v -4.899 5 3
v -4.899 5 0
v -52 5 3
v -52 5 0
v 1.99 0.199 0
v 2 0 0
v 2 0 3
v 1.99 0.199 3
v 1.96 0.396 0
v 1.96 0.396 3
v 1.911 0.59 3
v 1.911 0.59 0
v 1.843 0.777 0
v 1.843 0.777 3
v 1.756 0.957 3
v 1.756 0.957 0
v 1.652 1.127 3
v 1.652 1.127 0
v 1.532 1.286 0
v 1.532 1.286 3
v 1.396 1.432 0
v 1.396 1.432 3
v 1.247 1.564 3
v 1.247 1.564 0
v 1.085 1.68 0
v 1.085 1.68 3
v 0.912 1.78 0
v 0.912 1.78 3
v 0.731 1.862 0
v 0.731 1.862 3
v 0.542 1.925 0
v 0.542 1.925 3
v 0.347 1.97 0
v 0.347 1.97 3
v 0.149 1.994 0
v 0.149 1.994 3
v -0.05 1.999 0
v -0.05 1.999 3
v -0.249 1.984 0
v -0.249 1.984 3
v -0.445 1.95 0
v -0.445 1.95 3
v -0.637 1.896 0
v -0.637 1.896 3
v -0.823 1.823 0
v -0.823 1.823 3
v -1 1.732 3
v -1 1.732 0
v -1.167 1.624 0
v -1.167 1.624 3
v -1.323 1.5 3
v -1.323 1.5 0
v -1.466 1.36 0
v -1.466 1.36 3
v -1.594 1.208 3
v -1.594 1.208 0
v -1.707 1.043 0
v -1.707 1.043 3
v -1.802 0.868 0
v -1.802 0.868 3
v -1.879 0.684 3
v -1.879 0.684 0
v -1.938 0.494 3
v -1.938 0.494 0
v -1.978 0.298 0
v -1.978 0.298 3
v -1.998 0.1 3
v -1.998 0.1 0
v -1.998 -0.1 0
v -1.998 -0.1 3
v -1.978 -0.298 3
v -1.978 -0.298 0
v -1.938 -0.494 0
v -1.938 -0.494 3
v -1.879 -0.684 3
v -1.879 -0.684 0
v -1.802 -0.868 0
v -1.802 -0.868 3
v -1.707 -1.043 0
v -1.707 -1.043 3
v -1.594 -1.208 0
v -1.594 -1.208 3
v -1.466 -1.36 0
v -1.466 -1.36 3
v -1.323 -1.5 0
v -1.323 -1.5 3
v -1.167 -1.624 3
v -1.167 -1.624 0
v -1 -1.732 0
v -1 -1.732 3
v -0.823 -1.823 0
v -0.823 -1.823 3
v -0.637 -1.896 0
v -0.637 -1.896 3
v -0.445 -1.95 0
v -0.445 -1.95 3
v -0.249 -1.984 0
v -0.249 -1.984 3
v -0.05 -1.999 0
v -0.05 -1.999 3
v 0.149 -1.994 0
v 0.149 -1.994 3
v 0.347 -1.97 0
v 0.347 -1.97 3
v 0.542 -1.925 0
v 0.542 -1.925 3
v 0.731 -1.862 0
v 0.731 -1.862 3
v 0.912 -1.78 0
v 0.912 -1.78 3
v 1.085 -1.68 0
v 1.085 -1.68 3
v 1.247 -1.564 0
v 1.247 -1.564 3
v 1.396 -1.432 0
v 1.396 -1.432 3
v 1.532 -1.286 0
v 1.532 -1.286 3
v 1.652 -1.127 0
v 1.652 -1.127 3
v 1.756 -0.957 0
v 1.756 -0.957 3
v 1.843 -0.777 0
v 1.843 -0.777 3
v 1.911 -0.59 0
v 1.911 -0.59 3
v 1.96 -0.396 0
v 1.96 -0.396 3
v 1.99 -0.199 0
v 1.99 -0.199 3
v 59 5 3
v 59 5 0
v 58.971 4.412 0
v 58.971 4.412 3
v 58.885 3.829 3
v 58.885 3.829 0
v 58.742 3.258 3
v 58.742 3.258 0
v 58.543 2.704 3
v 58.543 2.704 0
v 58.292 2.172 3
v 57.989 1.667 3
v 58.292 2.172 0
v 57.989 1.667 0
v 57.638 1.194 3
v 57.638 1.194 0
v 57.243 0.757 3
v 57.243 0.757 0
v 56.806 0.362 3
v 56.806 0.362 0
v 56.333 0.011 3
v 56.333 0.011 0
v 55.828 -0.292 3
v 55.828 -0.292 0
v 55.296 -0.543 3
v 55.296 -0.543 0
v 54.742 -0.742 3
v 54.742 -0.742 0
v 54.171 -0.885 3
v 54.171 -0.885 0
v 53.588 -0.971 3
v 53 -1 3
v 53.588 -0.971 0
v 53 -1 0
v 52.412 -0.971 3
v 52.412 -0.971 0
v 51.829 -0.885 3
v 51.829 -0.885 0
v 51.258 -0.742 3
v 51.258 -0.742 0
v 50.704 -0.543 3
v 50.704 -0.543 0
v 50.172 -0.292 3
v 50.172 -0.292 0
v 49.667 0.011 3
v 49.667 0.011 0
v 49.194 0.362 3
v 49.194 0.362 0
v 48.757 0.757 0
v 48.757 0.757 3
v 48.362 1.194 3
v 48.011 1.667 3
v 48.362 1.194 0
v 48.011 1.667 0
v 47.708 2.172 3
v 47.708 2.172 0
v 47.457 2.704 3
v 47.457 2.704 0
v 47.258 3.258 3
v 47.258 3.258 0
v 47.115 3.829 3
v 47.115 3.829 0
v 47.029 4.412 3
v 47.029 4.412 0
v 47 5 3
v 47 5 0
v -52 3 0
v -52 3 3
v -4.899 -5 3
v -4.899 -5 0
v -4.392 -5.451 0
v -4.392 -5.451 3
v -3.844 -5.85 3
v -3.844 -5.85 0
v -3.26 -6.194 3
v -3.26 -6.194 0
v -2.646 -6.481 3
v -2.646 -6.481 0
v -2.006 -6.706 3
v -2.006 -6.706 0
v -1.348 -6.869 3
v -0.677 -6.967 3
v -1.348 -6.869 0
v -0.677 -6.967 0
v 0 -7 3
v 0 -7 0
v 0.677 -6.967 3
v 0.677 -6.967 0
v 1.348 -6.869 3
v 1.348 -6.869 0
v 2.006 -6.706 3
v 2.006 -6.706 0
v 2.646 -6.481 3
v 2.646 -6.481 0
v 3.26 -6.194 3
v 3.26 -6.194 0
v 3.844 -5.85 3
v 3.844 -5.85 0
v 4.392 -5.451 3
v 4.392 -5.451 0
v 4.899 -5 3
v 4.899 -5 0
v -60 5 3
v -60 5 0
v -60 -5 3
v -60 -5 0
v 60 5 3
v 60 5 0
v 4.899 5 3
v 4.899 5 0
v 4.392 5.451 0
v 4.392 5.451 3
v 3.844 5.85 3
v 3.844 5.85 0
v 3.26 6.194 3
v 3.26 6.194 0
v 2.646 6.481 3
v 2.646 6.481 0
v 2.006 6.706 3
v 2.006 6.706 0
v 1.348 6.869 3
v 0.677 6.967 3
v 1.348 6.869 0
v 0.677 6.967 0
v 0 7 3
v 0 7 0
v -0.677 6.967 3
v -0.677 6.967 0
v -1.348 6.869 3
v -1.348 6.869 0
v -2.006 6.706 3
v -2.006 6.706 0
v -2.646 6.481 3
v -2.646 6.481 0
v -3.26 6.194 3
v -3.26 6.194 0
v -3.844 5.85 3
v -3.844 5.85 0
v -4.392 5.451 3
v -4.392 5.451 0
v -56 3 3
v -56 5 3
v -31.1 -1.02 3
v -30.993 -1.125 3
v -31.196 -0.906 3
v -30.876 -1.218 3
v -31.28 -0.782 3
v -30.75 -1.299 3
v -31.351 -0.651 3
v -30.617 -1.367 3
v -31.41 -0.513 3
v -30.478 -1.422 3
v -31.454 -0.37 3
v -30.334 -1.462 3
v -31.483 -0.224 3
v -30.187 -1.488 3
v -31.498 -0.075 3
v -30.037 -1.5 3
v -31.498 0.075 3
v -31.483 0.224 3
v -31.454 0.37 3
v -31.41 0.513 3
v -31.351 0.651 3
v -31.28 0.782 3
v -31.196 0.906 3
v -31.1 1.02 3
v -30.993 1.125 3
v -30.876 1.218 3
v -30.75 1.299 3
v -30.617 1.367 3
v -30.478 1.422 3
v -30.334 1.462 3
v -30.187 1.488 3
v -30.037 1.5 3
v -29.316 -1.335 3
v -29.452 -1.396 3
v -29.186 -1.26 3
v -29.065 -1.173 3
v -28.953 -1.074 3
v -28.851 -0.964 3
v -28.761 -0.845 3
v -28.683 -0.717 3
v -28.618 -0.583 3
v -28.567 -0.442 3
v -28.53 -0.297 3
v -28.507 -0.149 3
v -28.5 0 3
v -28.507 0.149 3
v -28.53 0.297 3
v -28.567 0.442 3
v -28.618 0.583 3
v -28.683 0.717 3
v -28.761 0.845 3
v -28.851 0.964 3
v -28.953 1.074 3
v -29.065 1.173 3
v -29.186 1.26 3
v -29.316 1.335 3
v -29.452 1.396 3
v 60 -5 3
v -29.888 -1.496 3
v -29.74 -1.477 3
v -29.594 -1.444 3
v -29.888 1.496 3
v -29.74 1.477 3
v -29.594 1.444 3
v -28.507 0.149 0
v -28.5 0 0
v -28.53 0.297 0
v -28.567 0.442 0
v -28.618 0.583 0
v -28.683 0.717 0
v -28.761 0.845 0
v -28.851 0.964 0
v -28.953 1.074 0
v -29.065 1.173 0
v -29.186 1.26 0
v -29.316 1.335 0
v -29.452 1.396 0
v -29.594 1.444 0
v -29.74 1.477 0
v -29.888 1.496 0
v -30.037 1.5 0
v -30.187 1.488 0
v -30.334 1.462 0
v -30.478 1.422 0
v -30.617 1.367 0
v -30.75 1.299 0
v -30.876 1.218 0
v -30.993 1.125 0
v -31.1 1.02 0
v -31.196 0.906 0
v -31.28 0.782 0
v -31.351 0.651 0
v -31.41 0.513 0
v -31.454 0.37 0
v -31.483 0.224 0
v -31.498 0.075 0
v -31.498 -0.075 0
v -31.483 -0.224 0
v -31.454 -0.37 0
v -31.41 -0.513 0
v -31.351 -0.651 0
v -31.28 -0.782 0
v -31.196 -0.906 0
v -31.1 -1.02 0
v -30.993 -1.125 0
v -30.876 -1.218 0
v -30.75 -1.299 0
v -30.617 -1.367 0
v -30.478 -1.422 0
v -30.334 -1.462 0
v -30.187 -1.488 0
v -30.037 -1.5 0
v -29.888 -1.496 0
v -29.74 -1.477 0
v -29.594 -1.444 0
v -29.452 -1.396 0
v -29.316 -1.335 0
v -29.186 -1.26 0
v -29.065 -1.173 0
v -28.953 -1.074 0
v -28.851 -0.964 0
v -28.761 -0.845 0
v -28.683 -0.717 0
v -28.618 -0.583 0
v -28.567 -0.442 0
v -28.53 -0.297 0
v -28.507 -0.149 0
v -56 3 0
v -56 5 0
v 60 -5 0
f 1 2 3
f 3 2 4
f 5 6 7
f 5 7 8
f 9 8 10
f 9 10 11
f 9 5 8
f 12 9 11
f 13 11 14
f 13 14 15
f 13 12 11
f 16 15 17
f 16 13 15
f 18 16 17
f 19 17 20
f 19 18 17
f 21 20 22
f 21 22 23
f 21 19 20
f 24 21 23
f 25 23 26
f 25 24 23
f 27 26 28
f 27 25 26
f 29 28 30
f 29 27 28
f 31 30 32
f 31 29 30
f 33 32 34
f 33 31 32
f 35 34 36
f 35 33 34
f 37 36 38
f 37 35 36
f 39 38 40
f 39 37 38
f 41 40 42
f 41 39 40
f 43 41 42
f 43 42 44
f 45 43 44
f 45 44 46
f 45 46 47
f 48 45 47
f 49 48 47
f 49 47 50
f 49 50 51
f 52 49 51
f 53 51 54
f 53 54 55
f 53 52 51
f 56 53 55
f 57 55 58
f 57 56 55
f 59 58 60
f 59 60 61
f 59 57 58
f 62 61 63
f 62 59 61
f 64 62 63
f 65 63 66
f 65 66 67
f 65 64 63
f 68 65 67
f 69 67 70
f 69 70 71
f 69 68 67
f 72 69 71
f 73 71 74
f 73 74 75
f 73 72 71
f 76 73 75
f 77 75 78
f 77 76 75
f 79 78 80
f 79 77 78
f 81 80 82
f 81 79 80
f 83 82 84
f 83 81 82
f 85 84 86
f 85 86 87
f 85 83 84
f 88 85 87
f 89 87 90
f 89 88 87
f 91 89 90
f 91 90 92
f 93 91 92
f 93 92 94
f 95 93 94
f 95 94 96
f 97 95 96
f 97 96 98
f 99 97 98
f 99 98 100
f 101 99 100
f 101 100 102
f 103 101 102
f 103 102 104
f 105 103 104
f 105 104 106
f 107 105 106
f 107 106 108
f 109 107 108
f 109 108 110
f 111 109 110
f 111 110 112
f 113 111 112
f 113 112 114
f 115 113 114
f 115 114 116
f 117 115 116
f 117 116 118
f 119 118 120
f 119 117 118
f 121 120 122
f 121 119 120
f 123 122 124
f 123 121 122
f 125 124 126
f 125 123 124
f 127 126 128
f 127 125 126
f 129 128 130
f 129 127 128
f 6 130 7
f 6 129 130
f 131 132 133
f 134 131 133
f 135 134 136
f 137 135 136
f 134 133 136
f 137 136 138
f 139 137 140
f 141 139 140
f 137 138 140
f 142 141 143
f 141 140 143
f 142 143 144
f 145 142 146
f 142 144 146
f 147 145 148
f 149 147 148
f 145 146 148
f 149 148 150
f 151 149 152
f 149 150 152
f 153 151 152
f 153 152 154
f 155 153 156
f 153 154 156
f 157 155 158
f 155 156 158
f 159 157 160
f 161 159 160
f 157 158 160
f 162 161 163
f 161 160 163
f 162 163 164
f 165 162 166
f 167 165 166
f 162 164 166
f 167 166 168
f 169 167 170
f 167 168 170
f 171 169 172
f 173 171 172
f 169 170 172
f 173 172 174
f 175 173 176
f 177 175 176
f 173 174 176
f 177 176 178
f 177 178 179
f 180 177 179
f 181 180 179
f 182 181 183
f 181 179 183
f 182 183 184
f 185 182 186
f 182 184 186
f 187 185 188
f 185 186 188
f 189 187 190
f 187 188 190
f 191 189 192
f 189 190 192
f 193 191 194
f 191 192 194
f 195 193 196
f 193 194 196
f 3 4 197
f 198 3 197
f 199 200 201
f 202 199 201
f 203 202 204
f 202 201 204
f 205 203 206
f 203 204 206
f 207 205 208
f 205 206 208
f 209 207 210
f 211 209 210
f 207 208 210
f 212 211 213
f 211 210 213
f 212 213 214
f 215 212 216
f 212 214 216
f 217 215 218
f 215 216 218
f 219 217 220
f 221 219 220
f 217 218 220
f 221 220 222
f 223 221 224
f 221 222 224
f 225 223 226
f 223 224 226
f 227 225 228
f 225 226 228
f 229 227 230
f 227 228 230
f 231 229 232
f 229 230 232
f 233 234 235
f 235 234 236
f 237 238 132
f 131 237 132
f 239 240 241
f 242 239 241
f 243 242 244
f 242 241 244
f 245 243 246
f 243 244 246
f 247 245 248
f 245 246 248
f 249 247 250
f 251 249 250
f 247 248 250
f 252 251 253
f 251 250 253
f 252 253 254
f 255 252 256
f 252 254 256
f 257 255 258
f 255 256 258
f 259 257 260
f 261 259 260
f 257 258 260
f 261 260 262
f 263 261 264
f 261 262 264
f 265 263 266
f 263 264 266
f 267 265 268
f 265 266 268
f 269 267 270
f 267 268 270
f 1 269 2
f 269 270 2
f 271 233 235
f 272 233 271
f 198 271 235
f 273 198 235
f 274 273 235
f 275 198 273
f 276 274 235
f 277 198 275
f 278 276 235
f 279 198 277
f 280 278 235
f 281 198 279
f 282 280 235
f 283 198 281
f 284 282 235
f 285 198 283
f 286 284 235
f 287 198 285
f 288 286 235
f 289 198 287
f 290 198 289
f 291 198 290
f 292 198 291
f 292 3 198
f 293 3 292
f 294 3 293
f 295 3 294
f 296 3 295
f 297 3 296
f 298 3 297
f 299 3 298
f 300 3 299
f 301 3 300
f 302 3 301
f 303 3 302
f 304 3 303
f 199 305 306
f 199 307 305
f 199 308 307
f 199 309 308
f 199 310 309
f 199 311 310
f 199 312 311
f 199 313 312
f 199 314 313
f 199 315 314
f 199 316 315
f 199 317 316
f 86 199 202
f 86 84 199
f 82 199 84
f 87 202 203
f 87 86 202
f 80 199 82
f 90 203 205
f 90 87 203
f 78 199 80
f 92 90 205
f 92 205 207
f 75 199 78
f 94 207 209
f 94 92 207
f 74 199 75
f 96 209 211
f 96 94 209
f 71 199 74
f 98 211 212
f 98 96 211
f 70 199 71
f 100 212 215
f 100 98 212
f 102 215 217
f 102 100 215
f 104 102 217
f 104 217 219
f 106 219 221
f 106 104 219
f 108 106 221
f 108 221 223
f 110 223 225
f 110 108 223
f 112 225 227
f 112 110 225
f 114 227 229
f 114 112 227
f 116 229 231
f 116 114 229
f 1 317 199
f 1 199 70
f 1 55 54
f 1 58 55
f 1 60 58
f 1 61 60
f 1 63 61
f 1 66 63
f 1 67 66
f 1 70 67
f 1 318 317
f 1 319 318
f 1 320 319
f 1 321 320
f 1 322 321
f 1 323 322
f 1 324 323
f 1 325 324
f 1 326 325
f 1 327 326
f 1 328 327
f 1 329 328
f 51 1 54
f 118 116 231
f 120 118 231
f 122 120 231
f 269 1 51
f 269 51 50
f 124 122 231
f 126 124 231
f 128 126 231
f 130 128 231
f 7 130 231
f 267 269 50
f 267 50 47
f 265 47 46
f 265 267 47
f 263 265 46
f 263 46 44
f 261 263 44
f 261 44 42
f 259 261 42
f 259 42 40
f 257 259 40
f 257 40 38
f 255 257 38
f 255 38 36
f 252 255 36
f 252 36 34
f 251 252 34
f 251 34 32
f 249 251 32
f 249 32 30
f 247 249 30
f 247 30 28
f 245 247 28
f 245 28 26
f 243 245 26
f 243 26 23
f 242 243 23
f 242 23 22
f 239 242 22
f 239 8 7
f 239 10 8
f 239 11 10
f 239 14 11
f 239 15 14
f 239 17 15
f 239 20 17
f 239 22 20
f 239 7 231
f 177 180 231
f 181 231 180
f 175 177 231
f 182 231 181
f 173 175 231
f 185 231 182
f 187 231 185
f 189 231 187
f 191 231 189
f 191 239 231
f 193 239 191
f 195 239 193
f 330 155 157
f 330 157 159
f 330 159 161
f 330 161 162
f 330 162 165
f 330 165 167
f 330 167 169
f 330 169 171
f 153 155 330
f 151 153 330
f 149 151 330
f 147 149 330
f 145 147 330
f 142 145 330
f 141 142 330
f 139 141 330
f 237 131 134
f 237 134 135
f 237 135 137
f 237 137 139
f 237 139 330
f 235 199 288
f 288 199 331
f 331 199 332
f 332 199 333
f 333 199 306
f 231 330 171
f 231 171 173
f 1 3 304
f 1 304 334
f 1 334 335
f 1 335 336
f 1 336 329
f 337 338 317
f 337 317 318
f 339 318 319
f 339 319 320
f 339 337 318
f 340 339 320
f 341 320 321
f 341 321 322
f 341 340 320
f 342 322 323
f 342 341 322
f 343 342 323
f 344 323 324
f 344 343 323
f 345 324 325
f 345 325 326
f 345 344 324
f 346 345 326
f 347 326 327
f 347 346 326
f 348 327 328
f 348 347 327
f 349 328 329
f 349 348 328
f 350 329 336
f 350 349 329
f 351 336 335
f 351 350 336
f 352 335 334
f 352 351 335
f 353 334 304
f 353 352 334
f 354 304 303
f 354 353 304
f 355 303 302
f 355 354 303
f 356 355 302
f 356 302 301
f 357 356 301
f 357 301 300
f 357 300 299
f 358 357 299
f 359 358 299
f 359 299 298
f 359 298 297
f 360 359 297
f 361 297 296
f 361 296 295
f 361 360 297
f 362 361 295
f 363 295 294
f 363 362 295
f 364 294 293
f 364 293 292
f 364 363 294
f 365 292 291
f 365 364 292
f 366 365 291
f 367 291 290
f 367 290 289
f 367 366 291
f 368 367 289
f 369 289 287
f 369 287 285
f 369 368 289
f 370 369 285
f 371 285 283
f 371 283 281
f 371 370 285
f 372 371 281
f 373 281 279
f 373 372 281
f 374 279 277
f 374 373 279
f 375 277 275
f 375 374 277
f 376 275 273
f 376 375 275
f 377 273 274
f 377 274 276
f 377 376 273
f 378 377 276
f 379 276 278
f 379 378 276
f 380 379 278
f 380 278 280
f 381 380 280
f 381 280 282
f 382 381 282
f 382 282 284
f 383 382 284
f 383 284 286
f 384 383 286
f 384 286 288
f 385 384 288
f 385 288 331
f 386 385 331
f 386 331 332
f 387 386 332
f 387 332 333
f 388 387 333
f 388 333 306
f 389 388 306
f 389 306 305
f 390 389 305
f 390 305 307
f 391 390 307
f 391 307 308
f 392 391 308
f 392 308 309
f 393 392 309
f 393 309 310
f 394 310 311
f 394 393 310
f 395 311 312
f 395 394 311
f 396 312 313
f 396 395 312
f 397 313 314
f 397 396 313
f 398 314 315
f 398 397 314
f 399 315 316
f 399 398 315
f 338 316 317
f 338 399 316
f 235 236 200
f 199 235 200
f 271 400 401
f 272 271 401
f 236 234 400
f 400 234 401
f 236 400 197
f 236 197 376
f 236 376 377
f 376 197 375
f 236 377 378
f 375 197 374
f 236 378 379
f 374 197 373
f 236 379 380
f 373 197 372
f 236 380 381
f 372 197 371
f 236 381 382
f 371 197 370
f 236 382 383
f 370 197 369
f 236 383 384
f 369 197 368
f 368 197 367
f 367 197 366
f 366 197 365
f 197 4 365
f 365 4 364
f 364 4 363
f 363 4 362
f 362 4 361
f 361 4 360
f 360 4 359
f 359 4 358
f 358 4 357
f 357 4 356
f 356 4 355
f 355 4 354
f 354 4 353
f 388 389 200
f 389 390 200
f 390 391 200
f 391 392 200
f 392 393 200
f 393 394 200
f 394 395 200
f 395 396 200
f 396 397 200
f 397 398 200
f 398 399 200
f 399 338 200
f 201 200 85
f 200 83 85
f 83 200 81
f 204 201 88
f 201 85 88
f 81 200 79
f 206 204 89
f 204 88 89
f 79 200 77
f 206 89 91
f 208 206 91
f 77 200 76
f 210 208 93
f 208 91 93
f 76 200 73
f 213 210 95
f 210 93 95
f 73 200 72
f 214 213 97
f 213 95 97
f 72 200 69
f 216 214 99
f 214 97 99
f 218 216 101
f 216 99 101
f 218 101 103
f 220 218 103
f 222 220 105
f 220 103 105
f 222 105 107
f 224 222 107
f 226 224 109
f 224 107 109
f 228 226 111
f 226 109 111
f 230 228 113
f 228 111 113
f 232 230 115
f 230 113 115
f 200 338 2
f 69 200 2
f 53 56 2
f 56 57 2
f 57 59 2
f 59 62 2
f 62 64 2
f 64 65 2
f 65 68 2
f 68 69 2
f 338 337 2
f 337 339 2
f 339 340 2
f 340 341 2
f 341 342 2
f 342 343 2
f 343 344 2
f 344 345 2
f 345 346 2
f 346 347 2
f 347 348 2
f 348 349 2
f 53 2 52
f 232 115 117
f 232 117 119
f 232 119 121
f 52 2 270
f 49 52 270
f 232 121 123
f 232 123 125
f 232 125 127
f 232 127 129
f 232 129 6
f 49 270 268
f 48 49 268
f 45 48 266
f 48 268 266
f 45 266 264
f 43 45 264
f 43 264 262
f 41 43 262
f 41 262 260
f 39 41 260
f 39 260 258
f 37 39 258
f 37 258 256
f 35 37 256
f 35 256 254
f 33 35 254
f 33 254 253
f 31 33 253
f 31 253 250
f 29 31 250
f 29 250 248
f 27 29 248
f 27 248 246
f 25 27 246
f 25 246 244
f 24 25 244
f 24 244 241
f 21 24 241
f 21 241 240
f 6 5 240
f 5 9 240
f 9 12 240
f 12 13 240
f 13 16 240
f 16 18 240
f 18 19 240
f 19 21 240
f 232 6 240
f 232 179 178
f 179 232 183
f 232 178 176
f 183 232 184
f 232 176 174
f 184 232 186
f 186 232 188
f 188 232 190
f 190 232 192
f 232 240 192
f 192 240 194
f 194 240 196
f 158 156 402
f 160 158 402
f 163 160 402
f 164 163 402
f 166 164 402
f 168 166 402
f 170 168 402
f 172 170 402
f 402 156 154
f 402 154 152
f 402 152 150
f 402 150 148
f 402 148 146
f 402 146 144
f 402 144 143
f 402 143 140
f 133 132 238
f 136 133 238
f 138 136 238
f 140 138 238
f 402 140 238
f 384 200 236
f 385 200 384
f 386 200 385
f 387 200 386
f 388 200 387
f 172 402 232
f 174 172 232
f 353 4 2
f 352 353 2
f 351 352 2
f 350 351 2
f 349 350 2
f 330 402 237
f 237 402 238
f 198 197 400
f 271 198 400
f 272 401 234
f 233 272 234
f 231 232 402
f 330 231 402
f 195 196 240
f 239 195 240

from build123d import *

# Parameters (mm, degrees)
F0_R     = 1.5
F0_R_2   = 2
F1_DEPTH = 3


with BuildPart() as f1:
    # F0 (on Top) → F1 (new body)
    with BuildSketch(Plane.XY):
        with BuildLine():
            Line((-60, -5), (-4.8989794856, -5))
            ThreePointArc((-4.8989794856, -5), (-7, 0), (-4.8989794856, 5))
            Line((-4.8989794856, 5), (-52, 5))
            Line((-52, 5), (-52, 3))
            Line((-52, 3), (-56, 3))
            Line((-56, 3), (-56, 5))
            Line((-56, 5), (-60, 5))
            Line((-60, 5), (-60, -5))
        make_face()
        with Locations((-30, 0)):
            Circle(F0_R, mode=Mode.SUBTRACT)
        with BuildLine():
            Line((-4.8989794856, -5), (4.8989794856, -5))
            ThreePointArc((4.8989794856, -5), (6.4534043883, -2.7117470016), (7, 0))
            ThreePointArc((7, 0), (6.4534043883, 2.7117470016), (4.8989794856, 5))
            Line((4.8989794856, 5), (-4.8989794856, 5))
            ThreePointArc((-4.8989794856, 5), (-7, 0), (-4.8989794856, -5))
        make_face()
        Circle(F0_R_2, mode=Mode.SUBTRACT)
        with BuildLine():
            ThreePointArc((4.8989794856, 5), (0, 7), (-4.8989794856, 5))
            Line((-4.8989794856, 5), (4.8989794856, 5))
        make_face()
        with BuildLine():
            ThreePointArc((-4.8989794856, -5), (0, -7), (4.8989794856, -5))
            Line((4.8989794856, -5), (-4.8989794856, -5))
        make_face()
        with BuildLine():
            Line((4.8989794856, -5), (60, -5))
            Line((60, -5), (60, 5))
            Line((60, 5), (59, 5))
            ThreePointArc((59, 5), (53, -1), (47, 5))
            Line((47, 5), (4.8989794856, 5))
            ThreePointArc((4.8989794856, 5), (6.4534043883, 2.7117470016), (7, 0))
            ThreePointArc((7, 0), (6.4534043883, -2.7117470016), (4.8989794856, -5))
        make_face()
    extrude(amount=F1_DEPTH)


solid = f1.part
